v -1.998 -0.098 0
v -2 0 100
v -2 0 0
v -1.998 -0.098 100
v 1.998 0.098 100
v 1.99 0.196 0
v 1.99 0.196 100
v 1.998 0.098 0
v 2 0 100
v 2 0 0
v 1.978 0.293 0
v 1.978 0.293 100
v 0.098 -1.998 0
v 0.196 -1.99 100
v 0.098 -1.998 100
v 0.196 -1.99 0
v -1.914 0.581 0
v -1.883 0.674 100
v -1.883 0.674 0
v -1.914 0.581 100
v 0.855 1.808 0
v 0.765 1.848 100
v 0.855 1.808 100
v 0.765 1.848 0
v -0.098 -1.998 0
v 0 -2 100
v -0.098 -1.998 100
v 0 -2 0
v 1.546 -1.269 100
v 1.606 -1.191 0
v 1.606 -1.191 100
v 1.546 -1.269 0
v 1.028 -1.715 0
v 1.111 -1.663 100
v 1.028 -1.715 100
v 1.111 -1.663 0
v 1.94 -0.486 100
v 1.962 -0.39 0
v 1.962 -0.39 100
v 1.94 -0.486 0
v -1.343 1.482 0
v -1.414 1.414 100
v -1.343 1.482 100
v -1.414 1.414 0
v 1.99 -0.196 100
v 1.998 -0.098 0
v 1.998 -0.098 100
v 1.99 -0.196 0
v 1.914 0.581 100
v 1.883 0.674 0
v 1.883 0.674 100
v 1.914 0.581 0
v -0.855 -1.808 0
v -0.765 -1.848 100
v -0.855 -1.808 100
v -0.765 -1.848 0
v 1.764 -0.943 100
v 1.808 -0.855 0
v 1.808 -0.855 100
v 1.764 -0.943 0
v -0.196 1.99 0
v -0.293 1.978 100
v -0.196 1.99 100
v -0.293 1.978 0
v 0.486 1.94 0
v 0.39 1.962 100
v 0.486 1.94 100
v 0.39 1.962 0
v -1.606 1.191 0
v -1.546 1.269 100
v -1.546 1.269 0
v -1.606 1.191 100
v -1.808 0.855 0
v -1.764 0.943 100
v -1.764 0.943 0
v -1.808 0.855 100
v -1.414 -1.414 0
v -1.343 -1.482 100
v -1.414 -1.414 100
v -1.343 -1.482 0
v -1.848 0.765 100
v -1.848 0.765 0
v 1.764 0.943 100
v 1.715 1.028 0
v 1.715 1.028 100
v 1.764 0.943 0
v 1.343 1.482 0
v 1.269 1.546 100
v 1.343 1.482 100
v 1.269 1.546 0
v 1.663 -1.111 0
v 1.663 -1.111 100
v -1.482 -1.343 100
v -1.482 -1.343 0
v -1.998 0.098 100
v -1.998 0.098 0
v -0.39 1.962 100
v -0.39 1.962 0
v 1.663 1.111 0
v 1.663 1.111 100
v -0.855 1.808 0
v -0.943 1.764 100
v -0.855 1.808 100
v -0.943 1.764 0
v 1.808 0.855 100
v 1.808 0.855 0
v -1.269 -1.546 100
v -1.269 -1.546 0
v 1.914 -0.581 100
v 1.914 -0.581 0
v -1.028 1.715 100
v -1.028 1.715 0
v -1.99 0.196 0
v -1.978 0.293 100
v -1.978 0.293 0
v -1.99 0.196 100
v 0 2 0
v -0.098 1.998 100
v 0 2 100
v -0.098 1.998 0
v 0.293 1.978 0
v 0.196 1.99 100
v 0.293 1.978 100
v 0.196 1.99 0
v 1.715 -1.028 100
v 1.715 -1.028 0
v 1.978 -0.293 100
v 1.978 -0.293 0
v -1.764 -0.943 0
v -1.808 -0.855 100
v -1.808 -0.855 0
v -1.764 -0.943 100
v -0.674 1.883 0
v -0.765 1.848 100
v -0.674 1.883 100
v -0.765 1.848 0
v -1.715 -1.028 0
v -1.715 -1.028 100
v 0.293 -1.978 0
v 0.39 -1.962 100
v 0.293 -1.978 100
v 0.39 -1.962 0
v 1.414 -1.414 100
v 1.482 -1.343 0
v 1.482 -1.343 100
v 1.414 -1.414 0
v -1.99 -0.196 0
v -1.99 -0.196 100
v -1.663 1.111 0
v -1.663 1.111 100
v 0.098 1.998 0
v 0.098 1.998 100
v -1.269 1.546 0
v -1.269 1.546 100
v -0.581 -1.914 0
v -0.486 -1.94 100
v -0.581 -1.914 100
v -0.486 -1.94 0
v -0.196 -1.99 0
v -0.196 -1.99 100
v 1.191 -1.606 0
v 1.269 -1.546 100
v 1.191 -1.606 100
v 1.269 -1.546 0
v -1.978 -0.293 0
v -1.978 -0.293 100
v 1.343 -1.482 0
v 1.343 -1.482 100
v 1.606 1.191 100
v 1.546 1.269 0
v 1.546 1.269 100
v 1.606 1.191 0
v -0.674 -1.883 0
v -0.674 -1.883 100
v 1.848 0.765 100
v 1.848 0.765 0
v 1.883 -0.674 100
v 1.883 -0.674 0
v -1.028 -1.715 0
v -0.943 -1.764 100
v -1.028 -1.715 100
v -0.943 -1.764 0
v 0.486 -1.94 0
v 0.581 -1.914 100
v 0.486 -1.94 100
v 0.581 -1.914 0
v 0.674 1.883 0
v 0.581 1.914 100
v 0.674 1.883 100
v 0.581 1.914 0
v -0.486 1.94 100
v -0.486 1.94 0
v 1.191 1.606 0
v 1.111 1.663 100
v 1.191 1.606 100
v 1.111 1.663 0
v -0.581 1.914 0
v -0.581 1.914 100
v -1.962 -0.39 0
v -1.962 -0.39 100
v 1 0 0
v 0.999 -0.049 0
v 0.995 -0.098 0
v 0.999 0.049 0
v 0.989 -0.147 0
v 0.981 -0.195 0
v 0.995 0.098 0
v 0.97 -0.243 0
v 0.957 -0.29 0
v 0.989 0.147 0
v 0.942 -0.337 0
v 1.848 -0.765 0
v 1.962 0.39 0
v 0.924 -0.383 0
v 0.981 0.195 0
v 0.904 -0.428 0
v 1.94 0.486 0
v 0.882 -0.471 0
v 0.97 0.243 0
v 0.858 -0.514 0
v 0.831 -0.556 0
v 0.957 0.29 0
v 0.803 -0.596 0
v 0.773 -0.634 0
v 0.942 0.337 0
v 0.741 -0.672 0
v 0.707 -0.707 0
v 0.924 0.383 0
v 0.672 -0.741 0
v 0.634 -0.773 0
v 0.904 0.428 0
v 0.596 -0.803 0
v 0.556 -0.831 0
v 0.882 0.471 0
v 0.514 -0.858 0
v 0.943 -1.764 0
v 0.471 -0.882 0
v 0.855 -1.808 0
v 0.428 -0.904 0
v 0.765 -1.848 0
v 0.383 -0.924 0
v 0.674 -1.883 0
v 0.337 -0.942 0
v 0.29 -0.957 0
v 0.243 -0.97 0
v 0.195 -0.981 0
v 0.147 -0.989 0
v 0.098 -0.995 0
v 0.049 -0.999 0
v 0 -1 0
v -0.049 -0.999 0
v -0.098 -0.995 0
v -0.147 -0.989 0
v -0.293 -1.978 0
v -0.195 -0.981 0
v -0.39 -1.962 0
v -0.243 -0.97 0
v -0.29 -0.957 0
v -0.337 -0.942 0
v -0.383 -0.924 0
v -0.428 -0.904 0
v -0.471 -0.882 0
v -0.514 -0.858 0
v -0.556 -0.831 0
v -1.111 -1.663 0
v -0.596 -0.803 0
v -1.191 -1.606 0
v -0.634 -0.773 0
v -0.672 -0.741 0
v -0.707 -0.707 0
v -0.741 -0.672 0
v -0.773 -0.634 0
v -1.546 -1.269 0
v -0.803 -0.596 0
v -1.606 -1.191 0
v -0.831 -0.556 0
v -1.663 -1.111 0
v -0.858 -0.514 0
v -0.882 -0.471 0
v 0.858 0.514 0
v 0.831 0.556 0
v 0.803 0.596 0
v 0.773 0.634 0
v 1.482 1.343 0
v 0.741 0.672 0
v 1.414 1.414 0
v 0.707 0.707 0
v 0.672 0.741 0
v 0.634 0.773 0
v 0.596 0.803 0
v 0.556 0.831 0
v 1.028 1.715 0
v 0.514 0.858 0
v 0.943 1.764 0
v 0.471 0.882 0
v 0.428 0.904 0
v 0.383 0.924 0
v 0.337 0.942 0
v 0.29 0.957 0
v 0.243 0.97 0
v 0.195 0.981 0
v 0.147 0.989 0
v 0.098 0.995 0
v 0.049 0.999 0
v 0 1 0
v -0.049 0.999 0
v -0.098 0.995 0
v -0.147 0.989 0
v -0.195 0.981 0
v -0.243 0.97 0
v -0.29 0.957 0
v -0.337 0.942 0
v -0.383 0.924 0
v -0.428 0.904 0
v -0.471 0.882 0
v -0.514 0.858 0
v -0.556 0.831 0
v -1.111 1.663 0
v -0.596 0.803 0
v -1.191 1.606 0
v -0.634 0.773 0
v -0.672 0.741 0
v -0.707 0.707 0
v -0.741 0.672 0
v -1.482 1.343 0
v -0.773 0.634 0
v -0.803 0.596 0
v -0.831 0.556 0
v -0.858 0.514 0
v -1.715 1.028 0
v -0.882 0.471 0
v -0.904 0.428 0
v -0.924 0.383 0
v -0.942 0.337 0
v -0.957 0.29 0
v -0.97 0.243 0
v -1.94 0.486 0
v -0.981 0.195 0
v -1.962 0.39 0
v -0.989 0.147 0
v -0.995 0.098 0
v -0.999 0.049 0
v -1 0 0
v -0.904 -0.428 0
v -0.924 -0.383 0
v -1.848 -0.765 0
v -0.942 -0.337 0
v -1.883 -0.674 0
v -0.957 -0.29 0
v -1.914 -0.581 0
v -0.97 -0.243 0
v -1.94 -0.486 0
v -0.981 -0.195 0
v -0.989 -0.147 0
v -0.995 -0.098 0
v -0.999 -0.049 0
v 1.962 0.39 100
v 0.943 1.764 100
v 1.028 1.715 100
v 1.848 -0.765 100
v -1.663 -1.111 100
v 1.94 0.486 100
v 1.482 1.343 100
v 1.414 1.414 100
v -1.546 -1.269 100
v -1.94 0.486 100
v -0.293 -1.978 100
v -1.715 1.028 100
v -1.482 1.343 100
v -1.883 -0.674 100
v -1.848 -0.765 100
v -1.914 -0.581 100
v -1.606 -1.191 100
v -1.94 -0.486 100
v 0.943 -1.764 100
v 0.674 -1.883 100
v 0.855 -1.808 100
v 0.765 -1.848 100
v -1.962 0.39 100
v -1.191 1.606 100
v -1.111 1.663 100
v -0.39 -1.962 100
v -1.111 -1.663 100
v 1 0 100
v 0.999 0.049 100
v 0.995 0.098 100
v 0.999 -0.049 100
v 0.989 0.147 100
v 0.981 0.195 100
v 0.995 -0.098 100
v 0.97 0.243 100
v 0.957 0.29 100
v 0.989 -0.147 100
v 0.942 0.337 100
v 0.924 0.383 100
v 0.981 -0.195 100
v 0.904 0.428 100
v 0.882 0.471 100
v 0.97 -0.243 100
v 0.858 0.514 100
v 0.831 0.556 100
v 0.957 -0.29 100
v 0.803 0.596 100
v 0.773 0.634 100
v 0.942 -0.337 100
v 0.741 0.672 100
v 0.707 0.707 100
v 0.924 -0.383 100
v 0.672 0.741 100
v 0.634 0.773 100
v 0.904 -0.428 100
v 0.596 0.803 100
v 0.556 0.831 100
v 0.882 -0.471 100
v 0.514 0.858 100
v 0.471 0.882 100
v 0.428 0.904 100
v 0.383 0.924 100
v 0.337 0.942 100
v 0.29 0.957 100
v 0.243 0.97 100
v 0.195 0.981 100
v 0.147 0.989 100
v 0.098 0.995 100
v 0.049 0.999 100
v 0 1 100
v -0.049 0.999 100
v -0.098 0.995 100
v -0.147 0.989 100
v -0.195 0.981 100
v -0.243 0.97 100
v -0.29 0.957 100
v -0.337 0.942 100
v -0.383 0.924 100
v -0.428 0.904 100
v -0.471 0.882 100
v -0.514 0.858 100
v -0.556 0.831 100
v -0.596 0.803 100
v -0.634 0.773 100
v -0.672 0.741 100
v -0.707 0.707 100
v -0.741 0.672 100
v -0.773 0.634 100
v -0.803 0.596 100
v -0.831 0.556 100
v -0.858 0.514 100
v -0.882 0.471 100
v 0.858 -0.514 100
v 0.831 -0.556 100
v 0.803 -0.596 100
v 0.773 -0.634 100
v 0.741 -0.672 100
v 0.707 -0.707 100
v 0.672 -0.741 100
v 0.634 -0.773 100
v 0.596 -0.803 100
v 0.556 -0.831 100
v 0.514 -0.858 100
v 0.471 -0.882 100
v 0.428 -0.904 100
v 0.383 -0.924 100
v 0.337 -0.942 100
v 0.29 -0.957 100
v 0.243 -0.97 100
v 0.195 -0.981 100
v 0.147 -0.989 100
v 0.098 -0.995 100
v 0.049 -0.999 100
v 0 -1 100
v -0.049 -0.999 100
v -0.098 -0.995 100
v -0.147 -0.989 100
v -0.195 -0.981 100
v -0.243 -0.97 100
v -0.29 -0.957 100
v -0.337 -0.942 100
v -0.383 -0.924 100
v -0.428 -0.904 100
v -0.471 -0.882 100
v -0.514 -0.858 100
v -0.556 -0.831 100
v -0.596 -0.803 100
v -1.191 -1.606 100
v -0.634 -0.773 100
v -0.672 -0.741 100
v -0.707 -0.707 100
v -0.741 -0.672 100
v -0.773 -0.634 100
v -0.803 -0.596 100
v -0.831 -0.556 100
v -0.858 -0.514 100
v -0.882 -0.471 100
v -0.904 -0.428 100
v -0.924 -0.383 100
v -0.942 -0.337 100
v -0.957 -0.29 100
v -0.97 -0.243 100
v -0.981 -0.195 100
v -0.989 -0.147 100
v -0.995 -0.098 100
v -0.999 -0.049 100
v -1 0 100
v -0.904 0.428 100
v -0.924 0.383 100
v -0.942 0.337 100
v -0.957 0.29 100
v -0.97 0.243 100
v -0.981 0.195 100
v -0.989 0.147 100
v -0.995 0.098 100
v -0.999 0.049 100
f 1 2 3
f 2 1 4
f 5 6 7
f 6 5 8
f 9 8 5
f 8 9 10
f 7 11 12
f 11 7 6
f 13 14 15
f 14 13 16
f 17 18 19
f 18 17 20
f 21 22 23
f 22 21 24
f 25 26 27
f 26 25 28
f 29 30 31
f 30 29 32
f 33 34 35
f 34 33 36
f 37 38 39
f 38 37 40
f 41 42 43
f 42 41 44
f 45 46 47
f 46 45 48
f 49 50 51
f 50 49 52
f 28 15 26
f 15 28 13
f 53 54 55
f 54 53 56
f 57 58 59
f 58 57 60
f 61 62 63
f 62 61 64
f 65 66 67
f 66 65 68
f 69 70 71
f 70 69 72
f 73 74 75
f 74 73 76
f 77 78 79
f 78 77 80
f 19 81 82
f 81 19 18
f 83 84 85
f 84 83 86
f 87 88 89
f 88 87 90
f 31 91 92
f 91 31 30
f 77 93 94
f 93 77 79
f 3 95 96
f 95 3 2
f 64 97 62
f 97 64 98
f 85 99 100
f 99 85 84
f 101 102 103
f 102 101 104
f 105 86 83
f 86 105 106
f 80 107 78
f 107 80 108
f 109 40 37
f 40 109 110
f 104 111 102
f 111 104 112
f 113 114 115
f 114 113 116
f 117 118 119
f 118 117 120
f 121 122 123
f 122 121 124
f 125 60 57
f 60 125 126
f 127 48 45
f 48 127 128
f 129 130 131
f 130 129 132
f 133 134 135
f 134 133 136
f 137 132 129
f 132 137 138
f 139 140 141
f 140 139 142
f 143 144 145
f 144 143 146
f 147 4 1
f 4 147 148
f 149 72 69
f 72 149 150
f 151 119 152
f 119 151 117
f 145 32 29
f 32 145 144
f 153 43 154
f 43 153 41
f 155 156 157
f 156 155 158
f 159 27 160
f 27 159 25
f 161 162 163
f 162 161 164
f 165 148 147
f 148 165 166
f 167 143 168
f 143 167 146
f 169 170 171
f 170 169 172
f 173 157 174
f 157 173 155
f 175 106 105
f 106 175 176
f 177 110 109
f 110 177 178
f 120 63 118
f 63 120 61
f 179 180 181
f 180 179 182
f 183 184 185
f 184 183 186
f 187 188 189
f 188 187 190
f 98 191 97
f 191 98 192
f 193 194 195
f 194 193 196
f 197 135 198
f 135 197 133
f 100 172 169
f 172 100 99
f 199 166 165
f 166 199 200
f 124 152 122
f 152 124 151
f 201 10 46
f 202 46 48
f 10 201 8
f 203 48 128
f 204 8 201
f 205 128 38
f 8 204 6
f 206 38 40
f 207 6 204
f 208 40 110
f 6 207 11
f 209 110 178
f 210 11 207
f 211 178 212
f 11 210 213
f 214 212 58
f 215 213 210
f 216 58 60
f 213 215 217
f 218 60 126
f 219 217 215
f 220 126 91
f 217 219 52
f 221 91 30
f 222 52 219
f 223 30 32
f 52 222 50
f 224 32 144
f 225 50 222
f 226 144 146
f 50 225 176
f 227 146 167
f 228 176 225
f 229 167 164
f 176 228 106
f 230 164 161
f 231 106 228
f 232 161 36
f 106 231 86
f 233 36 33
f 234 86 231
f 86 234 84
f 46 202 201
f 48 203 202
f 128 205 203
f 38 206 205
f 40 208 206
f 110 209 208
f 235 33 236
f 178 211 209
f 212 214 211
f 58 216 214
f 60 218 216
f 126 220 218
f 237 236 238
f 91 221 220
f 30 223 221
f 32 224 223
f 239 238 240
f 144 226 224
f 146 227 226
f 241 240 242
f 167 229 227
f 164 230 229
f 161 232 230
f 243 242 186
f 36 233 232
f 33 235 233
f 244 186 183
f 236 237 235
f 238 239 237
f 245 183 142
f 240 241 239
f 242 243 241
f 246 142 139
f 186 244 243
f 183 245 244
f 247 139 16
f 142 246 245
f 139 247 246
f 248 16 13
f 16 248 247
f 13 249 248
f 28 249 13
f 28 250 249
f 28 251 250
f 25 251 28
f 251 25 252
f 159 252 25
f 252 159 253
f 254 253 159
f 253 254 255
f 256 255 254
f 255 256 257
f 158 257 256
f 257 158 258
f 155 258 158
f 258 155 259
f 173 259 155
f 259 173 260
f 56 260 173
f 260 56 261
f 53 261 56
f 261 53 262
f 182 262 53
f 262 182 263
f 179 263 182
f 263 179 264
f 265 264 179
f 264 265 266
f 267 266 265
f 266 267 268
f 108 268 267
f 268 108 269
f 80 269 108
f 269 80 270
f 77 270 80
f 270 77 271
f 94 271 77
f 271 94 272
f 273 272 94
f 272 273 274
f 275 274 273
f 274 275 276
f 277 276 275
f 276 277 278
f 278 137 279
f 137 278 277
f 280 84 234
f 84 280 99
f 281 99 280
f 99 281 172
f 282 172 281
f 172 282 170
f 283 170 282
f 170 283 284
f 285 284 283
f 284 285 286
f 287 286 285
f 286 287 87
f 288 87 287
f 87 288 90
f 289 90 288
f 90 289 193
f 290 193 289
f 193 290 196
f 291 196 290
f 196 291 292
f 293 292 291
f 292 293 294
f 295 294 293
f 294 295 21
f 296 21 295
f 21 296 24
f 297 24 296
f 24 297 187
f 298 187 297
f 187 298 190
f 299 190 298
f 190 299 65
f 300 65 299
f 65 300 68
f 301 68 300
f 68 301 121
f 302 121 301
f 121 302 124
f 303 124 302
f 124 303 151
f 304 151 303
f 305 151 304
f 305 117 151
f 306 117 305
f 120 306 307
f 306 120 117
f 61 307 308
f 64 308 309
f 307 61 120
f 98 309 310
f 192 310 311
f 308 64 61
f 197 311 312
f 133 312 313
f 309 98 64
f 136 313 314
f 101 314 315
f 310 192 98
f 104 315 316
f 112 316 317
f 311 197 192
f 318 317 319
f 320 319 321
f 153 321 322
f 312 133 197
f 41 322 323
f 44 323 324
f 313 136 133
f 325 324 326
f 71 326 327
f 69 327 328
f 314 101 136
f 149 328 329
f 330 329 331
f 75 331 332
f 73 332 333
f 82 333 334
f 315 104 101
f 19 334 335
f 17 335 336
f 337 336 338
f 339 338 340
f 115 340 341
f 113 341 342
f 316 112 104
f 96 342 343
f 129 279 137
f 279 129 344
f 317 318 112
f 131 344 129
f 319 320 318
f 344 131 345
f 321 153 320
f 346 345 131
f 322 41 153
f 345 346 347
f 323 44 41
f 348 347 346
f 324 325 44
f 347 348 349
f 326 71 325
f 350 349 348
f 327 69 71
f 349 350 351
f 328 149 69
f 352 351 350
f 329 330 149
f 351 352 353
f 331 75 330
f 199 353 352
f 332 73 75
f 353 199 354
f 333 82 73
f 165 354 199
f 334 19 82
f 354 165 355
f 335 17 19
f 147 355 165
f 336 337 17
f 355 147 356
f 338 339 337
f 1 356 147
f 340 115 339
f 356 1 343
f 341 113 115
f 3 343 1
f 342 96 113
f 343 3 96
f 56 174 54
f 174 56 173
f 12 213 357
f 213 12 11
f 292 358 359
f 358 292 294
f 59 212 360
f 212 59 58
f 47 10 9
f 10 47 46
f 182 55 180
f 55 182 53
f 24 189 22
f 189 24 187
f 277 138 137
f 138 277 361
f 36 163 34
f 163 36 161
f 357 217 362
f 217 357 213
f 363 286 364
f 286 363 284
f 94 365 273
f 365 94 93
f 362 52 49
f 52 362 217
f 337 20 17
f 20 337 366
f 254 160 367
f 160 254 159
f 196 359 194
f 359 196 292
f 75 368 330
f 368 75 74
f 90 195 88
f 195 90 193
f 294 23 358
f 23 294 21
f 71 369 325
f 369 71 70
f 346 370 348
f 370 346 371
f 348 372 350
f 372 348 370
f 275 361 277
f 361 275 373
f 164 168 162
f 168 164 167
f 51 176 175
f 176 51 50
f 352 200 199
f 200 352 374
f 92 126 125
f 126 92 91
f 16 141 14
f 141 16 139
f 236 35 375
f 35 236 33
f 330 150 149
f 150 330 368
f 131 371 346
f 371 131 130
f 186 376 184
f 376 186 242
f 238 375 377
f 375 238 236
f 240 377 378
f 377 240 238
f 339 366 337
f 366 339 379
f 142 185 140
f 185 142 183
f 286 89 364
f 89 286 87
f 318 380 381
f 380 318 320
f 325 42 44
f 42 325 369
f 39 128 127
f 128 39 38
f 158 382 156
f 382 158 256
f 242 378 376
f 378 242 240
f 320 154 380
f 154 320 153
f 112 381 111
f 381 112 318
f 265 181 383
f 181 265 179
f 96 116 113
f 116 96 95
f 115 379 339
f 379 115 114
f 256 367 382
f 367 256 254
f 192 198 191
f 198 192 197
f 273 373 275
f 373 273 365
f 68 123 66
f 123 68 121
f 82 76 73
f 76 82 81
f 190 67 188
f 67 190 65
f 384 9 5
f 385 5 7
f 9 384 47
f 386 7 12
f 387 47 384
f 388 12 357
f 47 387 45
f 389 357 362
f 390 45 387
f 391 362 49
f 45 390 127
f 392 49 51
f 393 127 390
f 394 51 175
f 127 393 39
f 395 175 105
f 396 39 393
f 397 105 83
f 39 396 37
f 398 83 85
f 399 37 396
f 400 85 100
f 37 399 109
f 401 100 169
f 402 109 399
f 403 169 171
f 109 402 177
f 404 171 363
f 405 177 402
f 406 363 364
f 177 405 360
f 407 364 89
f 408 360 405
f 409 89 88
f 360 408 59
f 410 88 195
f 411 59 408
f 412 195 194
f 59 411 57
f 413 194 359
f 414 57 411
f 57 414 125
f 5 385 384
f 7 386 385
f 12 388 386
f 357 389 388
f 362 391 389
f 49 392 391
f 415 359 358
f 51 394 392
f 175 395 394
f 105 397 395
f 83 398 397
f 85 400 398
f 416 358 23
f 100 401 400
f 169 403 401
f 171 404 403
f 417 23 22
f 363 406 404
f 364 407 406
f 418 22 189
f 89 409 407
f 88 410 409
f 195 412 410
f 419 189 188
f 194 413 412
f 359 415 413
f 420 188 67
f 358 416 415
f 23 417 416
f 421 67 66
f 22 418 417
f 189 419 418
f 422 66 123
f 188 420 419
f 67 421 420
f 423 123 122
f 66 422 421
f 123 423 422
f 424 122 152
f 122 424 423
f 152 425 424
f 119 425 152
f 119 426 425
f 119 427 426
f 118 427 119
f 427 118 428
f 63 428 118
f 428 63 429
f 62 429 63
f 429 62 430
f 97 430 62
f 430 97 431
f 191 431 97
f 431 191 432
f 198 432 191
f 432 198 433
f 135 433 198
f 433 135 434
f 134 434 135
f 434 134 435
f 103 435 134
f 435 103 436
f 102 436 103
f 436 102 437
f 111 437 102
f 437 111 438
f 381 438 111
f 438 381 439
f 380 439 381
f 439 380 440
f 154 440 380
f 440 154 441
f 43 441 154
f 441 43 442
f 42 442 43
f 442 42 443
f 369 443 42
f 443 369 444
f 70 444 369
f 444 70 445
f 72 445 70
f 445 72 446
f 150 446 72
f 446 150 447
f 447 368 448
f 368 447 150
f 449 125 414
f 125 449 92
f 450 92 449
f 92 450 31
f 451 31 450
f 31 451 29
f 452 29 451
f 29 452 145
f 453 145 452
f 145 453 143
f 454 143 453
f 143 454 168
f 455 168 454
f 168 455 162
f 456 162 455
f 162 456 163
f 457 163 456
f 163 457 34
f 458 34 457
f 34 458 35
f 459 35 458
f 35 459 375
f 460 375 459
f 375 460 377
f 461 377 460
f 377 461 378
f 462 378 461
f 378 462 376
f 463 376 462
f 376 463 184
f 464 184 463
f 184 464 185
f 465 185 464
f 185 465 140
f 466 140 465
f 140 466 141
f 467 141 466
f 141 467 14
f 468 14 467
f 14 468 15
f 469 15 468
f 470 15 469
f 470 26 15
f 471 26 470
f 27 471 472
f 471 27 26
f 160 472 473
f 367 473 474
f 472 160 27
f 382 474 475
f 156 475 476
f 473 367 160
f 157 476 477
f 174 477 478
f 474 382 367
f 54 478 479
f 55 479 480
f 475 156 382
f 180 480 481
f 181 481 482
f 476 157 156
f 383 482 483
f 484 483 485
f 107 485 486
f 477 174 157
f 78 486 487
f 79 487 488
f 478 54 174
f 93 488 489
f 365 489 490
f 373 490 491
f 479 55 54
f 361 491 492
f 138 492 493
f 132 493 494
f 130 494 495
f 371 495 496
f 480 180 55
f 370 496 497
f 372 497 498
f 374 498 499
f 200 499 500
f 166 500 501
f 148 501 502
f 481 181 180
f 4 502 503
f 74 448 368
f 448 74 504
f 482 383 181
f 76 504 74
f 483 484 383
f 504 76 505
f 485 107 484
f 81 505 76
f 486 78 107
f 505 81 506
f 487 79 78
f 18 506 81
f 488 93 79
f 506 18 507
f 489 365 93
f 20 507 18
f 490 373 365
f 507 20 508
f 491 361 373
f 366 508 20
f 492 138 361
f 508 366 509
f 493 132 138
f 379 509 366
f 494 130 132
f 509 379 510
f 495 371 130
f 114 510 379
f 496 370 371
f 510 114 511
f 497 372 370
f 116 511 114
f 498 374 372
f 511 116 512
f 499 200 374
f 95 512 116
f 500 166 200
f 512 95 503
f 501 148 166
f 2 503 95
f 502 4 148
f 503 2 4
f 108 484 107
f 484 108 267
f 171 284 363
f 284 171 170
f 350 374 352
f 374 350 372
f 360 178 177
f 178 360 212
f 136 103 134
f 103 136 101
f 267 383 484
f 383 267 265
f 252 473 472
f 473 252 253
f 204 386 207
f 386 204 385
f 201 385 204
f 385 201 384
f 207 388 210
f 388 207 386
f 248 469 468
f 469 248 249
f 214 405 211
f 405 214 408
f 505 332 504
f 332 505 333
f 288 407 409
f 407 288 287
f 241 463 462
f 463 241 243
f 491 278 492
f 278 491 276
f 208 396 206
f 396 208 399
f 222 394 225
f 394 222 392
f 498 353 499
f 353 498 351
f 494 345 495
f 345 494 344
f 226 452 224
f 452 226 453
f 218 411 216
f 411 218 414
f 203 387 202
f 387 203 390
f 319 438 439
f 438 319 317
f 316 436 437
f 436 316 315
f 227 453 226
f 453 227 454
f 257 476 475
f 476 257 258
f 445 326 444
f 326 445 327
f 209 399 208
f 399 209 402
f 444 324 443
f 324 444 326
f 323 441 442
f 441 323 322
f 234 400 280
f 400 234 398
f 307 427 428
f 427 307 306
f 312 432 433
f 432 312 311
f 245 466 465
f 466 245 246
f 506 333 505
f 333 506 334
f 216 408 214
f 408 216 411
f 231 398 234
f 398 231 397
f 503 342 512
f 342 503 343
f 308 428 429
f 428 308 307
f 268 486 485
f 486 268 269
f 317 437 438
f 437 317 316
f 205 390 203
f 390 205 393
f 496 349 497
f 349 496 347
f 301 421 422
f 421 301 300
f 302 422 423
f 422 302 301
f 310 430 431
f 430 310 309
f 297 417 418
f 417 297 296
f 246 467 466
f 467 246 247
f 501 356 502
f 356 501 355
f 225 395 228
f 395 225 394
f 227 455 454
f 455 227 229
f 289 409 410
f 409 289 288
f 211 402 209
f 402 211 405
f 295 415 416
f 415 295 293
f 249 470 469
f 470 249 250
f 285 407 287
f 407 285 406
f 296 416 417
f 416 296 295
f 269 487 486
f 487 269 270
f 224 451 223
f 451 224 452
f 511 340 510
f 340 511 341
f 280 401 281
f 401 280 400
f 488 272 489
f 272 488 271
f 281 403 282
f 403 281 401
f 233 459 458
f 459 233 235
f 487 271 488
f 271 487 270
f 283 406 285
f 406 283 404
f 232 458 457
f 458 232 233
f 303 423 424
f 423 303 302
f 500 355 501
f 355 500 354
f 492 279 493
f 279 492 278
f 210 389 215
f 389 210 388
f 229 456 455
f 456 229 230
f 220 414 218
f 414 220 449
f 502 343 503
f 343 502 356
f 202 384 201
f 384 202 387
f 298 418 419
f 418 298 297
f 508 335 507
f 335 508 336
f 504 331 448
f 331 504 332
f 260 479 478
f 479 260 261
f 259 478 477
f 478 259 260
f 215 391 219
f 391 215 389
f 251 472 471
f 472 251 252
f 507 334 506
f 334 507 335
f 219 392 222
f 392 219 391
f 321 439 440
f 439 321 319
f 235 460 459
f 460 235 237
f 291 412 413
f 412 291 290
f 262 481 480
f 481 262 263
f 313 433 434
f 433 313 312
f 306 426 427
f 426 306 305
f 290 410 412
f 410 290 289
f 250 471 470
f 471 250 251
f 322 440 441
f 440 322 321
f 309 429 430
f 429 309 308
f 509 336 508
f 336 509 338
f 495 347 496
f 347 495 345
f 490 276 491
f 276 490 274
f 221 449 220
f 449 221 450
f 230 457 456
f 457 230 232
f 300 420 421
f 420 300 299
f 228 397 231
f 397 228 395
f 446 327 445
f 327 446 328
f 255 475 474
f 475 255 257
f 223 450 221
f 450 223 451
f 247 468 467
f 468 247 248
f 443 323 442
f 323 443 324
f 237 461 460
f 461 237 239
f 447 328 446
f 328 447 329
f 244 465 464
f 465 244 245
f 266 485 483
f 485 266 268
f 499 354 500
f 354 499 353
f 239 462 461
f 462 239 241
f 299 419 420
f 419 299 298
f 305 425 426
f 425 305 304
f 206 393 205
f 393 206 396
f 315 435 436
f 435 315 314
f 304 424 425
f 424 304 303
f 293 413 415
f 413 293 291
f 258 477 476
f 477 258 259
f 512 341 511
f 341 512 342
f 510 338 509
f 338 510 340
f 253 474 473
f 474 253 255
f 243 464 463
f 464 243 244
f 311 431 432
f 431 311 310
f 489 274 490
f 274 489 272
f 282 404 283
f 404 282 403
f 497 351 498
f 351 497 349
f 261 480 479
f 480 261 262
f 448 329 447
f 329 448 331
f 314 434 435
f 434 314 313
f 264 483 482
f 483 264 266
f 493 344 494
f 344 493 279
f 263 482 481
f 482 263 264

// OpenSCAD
$fn = 128;

// PTFE tubing (simple hollow cylinder)
// Units: mm
outer_d = 4.0;     // typical PTFE tube OD
inner_d = 2.0;     // typical PTFE tube ID
length  = 100.0;   // tube length

module ptfe_tube(od, id, h) {
    difference() {
        cylinder(d=od, h=h, center=false);
        translate([0,0,-0.1]) cylinder(d=id, h=h+0.2, center=false);
    }
}

ptfe_tube(outer_d, inner_d, length);
